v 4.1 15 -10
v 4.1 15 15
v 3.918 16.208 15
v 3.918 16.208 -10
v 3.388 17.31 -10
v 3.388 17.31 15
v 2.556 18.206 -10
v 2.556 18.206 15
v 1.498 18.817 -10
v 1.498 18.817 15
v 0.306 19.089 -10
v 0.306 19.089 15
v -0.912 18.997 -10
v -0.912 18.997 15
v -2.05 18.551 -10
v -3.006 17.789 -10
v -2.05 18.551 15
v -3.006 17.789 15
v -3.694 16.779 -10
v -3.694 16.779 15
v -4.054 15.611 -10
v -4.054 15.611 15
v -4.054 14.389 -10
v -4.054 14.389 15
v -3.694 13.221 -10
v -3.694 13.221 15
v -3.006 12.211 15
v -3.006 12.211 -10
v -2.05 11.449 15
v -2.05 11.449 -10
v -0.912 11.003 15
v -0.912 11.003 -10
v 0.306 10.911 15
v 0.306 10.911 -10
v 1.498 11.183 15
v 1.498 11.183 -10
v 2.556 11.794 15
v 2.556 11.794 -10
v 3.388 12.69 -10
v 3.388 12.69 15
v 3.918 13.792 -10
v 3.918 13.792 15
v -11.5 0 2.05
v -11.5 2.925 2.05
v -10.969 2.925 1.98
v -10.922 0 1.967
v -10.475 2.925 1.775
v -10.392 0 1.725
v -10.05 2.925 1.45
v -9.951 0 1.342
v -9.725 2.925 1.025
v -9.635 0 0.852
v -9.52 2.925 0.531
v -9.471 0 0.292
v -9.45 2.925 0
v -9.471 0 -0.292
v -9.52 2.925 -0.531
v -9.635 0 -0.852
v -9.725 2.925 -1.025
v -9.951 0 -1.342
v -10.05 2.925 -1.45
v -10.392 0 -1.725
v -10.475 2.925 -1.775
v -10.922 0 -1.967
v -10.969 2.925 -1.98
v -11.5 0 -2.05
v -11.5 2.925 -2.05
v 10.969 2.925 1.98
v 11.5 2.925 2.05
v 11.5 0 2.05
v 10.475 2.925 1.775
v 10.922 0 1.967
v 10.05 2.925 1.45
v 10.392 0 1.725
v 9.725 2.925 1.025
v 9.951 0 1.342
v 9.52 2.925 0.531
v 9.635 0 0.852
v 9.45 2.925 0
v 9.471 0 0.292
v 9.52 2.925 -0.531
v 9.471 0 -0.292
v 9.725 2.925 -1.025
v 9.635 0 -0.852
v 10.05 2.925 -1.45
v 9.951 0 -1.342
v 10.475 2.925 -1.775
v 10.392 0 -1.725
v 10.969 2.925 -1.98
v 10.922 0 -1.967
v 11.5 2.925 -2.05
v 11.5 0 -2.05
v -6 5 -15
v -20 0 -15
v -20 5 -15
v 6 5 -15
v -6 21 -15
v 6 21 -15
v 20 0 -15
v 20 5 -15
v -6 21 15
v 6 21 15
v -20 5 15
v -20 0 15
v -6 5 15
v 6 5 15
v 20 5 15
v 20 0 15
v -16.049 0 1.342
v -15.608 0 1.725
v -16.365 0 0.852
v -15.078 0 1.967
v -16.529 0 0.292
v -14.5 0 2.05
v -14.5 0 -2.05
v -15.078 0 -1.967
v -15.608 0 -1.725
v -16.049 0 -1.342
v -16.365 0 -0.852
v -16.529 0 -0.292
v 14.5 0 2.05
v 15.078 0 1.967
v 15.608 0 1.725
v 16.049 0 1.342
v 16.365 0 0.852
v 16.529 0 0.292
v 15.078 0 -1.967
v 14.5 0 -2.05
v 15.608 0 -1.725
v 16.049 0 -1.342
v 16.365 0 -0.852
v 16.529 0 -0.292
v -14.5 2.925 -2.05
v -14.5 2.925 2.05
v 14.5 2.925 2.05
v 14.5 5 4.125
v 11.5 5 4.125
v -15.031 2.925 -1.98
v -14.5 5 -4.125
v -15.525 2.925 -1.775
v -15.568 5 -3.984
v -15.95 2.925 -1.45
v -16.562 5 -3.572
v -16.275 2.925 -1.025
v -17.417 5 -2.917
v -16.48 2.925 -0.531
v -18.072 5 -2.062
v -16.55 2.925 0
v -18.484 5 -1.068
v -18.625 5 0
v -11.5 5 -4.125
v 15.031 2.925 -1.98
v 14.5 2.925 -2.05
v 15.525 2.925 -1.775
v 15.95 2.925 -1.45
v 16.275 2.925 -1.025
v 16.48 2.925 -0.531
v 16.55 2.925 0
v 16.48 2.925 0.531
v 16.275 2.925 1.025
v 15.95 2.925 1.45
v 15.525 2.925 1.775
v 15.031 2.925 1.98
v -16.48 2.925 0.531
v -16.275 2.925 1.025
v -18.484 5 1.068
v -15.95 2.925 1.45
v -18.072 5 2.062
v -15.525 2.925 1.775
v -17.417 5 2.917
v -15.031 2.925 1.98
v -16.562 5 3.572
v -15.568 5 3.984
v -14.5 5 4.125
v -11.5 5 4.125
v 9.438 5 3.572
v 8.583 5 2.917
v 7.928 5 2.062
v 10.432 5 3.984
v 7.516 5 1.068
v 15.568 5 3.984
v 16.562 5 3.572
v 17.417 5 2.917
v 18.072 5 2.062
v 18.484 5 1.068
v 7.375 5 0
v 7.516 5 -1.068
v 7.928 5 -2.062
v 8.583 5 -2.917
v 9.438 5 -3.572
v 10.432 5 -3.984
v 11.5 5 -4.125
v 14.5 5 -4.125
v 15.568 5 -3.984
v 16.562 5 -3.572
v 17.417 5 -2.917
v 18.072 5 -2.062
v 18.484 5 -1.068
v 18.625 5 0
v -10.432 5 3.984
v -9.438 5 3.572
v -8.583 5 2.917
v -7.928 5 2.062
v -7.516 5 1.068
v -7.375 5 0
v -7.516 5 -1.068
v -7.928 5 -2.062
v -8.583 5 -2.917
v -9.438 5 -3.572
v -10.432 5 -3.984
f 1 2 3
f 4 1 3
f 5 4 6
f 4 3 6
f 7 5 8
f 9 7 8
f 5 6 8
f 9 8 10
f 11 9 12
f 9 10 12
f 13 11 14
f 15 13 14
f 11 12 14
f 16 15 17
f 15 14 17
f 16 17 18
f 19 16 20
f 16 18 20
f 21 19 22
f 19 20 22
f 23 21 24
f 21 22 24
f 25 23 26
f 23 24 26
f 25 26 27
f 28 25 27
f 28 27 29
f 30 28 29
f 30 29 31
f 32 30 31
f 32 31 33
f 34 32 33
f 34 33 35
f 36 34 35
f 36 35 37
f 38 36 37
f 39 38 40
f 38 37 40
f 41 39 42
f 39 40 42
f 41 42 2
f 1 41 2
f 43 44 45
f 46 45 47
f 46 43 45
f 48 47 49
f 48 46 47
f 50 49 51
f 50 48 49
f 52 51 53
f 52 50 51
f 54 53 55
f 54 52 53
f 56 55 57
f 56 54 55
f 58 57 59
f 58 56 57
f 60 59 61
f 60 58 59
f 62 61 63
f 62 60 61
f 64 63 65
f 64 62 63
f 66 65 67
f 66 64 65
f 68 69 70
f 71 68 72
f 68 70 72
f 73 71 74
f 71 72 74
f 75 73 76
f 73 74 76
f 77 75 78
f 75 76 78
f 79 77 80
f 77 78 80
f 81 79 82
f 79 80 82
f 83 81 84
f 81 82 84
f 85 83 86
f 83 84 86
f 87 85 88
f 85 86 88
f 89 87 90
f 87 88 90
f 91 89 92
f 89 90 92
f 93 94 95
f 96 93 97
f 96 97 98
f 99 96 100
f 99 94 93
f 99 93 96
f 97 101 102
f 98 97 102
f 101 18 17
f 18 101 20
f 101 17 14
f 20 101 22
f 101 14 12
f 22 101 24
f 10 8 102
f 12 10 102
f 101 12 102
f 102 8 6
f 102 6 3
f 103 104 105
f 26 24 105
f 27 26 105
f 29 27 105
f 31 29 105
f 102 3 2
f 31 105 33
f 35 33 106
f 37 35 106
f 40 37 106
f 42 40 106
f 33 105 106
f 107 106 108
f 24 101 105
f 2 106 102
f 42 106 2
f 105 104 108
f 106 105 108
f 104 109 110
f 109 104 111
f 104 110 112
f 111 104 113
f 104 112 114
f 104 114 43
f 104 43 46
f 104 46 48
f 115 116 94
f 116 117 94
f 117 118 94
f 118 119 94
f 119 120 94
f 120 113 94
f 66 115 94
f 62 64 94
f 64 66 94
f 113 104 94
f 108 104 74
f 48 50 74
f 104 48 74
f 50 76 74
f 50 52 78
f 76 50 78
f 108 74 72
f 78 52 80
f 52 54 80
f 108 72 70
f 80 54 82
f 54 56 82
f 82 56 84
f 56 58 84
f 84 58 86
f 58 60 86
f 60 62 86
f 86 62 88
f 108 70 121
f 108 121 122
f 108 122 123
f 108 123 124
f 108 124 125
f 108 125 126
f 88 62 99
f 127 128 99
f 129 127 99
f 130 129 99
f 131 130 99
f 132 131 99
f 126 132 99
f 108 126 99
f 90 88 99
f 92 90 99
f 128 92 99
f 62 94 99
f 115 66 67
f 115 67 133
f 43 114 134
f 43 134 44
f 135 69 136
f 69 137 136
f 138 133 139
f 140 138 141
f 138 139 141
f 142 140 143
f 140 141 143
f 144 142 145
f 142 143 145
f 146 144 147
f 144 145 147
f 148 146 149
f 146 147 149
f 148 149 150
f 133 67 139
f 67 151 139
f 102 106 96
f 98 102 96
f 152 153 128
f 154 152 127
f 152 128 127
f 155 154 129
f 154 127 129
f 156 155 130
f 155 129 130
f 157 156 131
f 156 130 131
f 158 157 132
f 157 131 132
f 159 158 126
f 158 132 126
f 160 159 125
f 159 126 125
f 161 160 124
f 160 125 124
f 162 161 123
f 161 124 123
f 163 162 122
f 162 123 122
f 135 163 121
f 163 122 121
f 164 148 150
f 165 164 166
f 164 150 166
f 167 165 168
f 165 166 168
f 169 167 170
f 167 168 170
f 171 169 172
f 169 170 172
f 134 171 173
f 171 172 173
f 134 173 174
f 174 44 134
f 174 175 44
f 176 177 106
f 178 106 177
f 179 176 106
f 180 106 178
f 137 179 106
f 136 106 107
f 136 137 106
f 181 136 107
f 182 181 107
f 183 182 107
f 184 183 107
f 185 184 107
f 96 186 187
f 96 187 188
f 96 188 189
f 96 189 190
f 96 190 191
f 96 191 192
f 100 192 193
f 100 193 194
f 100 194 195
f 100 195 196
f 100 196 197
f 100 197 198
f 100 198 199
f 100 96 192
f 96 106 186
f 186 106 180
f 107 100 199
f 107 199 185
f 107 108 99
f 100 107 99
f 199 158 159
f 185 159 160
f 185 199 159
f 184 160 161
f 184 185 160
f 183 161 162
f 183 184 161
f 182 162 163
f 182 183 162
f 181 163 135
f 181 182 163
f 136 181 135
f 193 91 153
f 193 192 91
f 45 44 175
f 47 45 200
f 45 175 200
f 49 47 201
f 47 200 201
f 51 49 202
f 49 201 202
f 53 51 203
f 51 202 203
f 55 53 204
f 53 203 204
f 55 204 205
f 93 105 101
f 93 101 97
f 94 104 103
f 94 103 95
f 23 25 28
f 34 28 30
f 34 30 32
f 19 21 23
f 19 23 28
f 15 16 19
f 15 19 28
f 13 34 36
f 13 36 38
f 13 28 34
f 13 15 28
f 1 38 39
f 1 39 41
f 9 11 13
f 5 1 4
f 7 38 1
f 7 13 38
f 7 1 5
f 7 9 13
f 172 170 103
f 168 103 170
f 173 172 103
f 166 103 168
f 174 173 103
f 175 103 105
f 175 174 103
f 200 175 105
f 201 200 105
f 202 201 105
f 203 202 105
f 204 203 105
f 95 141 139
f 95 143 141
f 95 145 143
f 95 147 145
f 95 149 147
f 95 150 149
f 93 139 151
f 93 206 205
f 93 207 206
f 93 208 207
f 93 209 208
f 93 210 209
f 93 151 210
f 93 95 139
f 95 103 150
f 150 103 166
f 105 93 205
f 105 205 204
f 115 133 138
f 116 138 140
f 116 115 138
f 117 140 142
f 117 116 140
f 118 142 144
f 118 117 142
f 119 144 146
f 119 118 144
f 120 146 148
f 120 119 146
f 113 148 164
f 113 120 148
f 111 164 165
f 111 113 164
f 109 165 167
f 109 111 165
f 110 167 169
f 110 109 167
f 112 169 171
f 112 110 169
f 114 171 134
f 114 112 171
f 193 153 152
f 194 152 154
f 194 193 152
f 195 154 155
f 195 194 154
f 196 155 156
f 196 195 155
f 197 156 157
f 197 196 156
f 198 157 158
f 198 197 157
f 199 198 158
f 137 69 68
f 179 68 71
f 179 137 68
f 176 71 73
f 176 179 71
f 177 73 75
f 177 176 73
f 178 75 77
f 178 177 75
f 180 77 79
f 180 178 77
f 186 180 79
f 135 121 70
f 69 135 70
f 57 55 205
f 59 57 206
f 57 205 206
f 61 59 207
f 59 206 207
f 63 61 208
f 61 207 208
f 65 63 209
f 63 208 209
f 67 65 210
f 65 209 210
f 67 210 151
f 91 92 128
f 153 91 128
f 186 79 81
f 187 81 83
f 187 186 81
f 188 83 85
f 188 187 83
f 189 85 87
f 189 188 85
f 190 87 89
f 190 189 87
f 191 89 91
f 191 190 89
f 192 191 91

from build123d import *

# Parameters (mm, degrees)
SKIZZE1_W                                      = 40
SKIZZE1_H                                      = 30
AUFSATZ_LINEAR_AUSTRAGEN1_DEPTH                = 5
SKIZZE3_W                                      = 12
SKIZZE3_H                                      = 30
AUFSATZ_LINEAR_AUSTRAGEN2_DEPTH                = 16
SKIZZE4_R                                      = 4.1
SCHNITT_LINEAR_AUSTRAGEN1_DEPTH                = 25
FORMSENKUNG_LANGLOCH_F_R_M3_SENKSCHRAUBE_DEPTH = 5


with BuildPart() as part:
    # Skizze1 → Aufsatz-Linear austragen1 (new body)
    with BuildSketch(Plane(origin=(0, 0, 0), x_dir=(1, 0, 0), z_dir=(0, 1, 0))):
        Rectangle(SKIZZE1_W, SKIZZE1_H)
    extrude(amount=AUFSATZ_LINEAR_AUSTRAGEN1_DEPTH)

    # Skizze3 → Aufsatz-Linear austragen2 (add)
    with BuildSketch(Plane(origin=(0, 5, 0), x_dir=(1, 0, 0), z_dir=(0, 1, 0))):
        Rectangle(SKIZZE3_W, SKIZZE3_H)
    extrude(amount=AUFSATZ_LINEAR_AUSTRAGEN2_DEPTH)

    # Skizze4 → Schnitt-Linear austragen1 (cut)
    with BuildSketch(Plane.XY.offset(15)):
        with Locations((0, 15)):
            Circle(SKIZZE4_R)
    extrude(amount=-SCHNITT_LINEAR_AUSTRAGEN1_DEPTH, mode=Mode.SUBTRACT)

    # Formsenkung Langloch für M3 Senkschraube mit Schlitz/Kreuzschlitz1: read off the stored shape, not the designer's step
    # Formsenkung Langloch f_r M3 Senkschr 2 → Formsenkung Langloch für M3 Senkschraube mit Schlitz/Kreuzschlitz1 (cut)
    with BuildSketch(Plane(origin=(0, 0, 0), x_dir=(1, 0, 0), z_dir=(0, 1, 0))):
        with BuildLine():
            Line((-14.5, -2.05), (-11.5, -2.05))
            ThreePointArc((-11.5, -2.05), (-9.45, 0), (-11.5, 2.05))
            Line((-11.5, 2.05), (-14.5, 2.05))
            ThreePointArc((-14.5, 2.05), (-16.55, 0), (-14.5, -2.05))
        make_face()
    formsenkung_langloch_f_r_m3_senkschraube = extrude(amount=FORMSENKUNG_LANGLOCH_F_R_M3_SENKSCHRAUBE_DEPTH, mode=Mode.SUBTRACT)

    # Formsenkung Langloch f_r M3 Senkschr 3: loft between two sections, ruled curve by curve
    formsenkung_langloch_f_r_m3_senkschr_3_from = [
        Edge.make_three_point_arc((-11.5, 2.925, 2.05), (-10.050431099, 2.925, 1.449568901), (-9.45, 2.925, 0)),
        Edge.make_three_point_arc((-9.45, 2.925, 0), (-10.050431099, 2.925, -1.449568901), (-11.5, 2.925, -2.05)),
        Edge.make_three_point_arc((-14.5, 2.925, -2.05), (-15.949568901, 2.925, -1.449568901), (-16.55, 2.925, 0)),
        Edge.make_three_point_arc((-16.55, 2.925, 0), (-15.949568901, 2.925, 1.449568901), (-14.5, 2.925, 2.05)),
        Edge.make_line((-11.5, 2.925, -2.05), (-14.5, 2.925, -2.05)),
        Edge.make_line((-11.5, 2.925, 2.05), (-14.5, 2.925, 2.05)),
    ]
    formsenkung_langloch_f_r_m3_senkschr_3_to = [
        Edge.make_three_point_arc((-11.5, 5, 4.125), (-8.583184528, 5, 2.916815472), (-7.375, 5, 0)),
        Edge.make_three_point_arc((-7.375, 5, 0), (-8.583184528, 5, -2.916815472), (-11.5, 5, -4.125)),
        Edge.make_three_point_arc((-14.5, 5, -4.125), (-17.416815472, 5, -2.916815472), (-18.625, 5, 0)),
        Edge.make_three_point_arc((-18.625, 5, 0), (-17.416815472, 5, 2.916815472), (-14.5, 5, 4.125)),
        Edge.make_line((-11.5, 5, -4.125), (-14.5, 5, -4.125)),
        Edge.make_line((-11.5, 5, 4.125), (-14.5, 5, 4.125)),
    ]
    formsenkung_langloch_f_r_m3_senkschr_3 = Solid(Shell([*[Face.make_surface_from_curves(formsenkung_langloch_f_r_m3_senkschr_3_from[k], formsenkung_langloch_f_r_m3_senkschr_3_to[k]) for k in range(6)], Face(Wire(formsenkung_langloch_f_r_m3_senkschr_3_from)), Face(Wire(formsenkung_langloch_f_r_m3_senkschr_3_to))]))
    add(formsenkung_langloch_f_r_m3_senkschr_3, mode=Mode.SUBTRACT)

    # Spiegeln1: Formsenkung Langloch für M3 Senkschraube mit Schlitz/Kreuzschlitz1, Formsenkung Langloch f_r M3 Senkschr 3 across plane
    add(formsenkung_langloch_f_r_m3_senkschraube.mirror(Plane(origin=(0, 0, 0), x_dir=(0, 0, 1), z_dir=(1, 0, 0))), mode=Mode.SUBTRACT)
    add(formsenkung_langloch_f_r_m3_senkschr_3.mirror(Plane(origin=(0, 0, 0), x_dir=(0, 0, 1), z_dir=(1, 0, 0))), mode=Mode.SUBTRACT)


solid = part.part
